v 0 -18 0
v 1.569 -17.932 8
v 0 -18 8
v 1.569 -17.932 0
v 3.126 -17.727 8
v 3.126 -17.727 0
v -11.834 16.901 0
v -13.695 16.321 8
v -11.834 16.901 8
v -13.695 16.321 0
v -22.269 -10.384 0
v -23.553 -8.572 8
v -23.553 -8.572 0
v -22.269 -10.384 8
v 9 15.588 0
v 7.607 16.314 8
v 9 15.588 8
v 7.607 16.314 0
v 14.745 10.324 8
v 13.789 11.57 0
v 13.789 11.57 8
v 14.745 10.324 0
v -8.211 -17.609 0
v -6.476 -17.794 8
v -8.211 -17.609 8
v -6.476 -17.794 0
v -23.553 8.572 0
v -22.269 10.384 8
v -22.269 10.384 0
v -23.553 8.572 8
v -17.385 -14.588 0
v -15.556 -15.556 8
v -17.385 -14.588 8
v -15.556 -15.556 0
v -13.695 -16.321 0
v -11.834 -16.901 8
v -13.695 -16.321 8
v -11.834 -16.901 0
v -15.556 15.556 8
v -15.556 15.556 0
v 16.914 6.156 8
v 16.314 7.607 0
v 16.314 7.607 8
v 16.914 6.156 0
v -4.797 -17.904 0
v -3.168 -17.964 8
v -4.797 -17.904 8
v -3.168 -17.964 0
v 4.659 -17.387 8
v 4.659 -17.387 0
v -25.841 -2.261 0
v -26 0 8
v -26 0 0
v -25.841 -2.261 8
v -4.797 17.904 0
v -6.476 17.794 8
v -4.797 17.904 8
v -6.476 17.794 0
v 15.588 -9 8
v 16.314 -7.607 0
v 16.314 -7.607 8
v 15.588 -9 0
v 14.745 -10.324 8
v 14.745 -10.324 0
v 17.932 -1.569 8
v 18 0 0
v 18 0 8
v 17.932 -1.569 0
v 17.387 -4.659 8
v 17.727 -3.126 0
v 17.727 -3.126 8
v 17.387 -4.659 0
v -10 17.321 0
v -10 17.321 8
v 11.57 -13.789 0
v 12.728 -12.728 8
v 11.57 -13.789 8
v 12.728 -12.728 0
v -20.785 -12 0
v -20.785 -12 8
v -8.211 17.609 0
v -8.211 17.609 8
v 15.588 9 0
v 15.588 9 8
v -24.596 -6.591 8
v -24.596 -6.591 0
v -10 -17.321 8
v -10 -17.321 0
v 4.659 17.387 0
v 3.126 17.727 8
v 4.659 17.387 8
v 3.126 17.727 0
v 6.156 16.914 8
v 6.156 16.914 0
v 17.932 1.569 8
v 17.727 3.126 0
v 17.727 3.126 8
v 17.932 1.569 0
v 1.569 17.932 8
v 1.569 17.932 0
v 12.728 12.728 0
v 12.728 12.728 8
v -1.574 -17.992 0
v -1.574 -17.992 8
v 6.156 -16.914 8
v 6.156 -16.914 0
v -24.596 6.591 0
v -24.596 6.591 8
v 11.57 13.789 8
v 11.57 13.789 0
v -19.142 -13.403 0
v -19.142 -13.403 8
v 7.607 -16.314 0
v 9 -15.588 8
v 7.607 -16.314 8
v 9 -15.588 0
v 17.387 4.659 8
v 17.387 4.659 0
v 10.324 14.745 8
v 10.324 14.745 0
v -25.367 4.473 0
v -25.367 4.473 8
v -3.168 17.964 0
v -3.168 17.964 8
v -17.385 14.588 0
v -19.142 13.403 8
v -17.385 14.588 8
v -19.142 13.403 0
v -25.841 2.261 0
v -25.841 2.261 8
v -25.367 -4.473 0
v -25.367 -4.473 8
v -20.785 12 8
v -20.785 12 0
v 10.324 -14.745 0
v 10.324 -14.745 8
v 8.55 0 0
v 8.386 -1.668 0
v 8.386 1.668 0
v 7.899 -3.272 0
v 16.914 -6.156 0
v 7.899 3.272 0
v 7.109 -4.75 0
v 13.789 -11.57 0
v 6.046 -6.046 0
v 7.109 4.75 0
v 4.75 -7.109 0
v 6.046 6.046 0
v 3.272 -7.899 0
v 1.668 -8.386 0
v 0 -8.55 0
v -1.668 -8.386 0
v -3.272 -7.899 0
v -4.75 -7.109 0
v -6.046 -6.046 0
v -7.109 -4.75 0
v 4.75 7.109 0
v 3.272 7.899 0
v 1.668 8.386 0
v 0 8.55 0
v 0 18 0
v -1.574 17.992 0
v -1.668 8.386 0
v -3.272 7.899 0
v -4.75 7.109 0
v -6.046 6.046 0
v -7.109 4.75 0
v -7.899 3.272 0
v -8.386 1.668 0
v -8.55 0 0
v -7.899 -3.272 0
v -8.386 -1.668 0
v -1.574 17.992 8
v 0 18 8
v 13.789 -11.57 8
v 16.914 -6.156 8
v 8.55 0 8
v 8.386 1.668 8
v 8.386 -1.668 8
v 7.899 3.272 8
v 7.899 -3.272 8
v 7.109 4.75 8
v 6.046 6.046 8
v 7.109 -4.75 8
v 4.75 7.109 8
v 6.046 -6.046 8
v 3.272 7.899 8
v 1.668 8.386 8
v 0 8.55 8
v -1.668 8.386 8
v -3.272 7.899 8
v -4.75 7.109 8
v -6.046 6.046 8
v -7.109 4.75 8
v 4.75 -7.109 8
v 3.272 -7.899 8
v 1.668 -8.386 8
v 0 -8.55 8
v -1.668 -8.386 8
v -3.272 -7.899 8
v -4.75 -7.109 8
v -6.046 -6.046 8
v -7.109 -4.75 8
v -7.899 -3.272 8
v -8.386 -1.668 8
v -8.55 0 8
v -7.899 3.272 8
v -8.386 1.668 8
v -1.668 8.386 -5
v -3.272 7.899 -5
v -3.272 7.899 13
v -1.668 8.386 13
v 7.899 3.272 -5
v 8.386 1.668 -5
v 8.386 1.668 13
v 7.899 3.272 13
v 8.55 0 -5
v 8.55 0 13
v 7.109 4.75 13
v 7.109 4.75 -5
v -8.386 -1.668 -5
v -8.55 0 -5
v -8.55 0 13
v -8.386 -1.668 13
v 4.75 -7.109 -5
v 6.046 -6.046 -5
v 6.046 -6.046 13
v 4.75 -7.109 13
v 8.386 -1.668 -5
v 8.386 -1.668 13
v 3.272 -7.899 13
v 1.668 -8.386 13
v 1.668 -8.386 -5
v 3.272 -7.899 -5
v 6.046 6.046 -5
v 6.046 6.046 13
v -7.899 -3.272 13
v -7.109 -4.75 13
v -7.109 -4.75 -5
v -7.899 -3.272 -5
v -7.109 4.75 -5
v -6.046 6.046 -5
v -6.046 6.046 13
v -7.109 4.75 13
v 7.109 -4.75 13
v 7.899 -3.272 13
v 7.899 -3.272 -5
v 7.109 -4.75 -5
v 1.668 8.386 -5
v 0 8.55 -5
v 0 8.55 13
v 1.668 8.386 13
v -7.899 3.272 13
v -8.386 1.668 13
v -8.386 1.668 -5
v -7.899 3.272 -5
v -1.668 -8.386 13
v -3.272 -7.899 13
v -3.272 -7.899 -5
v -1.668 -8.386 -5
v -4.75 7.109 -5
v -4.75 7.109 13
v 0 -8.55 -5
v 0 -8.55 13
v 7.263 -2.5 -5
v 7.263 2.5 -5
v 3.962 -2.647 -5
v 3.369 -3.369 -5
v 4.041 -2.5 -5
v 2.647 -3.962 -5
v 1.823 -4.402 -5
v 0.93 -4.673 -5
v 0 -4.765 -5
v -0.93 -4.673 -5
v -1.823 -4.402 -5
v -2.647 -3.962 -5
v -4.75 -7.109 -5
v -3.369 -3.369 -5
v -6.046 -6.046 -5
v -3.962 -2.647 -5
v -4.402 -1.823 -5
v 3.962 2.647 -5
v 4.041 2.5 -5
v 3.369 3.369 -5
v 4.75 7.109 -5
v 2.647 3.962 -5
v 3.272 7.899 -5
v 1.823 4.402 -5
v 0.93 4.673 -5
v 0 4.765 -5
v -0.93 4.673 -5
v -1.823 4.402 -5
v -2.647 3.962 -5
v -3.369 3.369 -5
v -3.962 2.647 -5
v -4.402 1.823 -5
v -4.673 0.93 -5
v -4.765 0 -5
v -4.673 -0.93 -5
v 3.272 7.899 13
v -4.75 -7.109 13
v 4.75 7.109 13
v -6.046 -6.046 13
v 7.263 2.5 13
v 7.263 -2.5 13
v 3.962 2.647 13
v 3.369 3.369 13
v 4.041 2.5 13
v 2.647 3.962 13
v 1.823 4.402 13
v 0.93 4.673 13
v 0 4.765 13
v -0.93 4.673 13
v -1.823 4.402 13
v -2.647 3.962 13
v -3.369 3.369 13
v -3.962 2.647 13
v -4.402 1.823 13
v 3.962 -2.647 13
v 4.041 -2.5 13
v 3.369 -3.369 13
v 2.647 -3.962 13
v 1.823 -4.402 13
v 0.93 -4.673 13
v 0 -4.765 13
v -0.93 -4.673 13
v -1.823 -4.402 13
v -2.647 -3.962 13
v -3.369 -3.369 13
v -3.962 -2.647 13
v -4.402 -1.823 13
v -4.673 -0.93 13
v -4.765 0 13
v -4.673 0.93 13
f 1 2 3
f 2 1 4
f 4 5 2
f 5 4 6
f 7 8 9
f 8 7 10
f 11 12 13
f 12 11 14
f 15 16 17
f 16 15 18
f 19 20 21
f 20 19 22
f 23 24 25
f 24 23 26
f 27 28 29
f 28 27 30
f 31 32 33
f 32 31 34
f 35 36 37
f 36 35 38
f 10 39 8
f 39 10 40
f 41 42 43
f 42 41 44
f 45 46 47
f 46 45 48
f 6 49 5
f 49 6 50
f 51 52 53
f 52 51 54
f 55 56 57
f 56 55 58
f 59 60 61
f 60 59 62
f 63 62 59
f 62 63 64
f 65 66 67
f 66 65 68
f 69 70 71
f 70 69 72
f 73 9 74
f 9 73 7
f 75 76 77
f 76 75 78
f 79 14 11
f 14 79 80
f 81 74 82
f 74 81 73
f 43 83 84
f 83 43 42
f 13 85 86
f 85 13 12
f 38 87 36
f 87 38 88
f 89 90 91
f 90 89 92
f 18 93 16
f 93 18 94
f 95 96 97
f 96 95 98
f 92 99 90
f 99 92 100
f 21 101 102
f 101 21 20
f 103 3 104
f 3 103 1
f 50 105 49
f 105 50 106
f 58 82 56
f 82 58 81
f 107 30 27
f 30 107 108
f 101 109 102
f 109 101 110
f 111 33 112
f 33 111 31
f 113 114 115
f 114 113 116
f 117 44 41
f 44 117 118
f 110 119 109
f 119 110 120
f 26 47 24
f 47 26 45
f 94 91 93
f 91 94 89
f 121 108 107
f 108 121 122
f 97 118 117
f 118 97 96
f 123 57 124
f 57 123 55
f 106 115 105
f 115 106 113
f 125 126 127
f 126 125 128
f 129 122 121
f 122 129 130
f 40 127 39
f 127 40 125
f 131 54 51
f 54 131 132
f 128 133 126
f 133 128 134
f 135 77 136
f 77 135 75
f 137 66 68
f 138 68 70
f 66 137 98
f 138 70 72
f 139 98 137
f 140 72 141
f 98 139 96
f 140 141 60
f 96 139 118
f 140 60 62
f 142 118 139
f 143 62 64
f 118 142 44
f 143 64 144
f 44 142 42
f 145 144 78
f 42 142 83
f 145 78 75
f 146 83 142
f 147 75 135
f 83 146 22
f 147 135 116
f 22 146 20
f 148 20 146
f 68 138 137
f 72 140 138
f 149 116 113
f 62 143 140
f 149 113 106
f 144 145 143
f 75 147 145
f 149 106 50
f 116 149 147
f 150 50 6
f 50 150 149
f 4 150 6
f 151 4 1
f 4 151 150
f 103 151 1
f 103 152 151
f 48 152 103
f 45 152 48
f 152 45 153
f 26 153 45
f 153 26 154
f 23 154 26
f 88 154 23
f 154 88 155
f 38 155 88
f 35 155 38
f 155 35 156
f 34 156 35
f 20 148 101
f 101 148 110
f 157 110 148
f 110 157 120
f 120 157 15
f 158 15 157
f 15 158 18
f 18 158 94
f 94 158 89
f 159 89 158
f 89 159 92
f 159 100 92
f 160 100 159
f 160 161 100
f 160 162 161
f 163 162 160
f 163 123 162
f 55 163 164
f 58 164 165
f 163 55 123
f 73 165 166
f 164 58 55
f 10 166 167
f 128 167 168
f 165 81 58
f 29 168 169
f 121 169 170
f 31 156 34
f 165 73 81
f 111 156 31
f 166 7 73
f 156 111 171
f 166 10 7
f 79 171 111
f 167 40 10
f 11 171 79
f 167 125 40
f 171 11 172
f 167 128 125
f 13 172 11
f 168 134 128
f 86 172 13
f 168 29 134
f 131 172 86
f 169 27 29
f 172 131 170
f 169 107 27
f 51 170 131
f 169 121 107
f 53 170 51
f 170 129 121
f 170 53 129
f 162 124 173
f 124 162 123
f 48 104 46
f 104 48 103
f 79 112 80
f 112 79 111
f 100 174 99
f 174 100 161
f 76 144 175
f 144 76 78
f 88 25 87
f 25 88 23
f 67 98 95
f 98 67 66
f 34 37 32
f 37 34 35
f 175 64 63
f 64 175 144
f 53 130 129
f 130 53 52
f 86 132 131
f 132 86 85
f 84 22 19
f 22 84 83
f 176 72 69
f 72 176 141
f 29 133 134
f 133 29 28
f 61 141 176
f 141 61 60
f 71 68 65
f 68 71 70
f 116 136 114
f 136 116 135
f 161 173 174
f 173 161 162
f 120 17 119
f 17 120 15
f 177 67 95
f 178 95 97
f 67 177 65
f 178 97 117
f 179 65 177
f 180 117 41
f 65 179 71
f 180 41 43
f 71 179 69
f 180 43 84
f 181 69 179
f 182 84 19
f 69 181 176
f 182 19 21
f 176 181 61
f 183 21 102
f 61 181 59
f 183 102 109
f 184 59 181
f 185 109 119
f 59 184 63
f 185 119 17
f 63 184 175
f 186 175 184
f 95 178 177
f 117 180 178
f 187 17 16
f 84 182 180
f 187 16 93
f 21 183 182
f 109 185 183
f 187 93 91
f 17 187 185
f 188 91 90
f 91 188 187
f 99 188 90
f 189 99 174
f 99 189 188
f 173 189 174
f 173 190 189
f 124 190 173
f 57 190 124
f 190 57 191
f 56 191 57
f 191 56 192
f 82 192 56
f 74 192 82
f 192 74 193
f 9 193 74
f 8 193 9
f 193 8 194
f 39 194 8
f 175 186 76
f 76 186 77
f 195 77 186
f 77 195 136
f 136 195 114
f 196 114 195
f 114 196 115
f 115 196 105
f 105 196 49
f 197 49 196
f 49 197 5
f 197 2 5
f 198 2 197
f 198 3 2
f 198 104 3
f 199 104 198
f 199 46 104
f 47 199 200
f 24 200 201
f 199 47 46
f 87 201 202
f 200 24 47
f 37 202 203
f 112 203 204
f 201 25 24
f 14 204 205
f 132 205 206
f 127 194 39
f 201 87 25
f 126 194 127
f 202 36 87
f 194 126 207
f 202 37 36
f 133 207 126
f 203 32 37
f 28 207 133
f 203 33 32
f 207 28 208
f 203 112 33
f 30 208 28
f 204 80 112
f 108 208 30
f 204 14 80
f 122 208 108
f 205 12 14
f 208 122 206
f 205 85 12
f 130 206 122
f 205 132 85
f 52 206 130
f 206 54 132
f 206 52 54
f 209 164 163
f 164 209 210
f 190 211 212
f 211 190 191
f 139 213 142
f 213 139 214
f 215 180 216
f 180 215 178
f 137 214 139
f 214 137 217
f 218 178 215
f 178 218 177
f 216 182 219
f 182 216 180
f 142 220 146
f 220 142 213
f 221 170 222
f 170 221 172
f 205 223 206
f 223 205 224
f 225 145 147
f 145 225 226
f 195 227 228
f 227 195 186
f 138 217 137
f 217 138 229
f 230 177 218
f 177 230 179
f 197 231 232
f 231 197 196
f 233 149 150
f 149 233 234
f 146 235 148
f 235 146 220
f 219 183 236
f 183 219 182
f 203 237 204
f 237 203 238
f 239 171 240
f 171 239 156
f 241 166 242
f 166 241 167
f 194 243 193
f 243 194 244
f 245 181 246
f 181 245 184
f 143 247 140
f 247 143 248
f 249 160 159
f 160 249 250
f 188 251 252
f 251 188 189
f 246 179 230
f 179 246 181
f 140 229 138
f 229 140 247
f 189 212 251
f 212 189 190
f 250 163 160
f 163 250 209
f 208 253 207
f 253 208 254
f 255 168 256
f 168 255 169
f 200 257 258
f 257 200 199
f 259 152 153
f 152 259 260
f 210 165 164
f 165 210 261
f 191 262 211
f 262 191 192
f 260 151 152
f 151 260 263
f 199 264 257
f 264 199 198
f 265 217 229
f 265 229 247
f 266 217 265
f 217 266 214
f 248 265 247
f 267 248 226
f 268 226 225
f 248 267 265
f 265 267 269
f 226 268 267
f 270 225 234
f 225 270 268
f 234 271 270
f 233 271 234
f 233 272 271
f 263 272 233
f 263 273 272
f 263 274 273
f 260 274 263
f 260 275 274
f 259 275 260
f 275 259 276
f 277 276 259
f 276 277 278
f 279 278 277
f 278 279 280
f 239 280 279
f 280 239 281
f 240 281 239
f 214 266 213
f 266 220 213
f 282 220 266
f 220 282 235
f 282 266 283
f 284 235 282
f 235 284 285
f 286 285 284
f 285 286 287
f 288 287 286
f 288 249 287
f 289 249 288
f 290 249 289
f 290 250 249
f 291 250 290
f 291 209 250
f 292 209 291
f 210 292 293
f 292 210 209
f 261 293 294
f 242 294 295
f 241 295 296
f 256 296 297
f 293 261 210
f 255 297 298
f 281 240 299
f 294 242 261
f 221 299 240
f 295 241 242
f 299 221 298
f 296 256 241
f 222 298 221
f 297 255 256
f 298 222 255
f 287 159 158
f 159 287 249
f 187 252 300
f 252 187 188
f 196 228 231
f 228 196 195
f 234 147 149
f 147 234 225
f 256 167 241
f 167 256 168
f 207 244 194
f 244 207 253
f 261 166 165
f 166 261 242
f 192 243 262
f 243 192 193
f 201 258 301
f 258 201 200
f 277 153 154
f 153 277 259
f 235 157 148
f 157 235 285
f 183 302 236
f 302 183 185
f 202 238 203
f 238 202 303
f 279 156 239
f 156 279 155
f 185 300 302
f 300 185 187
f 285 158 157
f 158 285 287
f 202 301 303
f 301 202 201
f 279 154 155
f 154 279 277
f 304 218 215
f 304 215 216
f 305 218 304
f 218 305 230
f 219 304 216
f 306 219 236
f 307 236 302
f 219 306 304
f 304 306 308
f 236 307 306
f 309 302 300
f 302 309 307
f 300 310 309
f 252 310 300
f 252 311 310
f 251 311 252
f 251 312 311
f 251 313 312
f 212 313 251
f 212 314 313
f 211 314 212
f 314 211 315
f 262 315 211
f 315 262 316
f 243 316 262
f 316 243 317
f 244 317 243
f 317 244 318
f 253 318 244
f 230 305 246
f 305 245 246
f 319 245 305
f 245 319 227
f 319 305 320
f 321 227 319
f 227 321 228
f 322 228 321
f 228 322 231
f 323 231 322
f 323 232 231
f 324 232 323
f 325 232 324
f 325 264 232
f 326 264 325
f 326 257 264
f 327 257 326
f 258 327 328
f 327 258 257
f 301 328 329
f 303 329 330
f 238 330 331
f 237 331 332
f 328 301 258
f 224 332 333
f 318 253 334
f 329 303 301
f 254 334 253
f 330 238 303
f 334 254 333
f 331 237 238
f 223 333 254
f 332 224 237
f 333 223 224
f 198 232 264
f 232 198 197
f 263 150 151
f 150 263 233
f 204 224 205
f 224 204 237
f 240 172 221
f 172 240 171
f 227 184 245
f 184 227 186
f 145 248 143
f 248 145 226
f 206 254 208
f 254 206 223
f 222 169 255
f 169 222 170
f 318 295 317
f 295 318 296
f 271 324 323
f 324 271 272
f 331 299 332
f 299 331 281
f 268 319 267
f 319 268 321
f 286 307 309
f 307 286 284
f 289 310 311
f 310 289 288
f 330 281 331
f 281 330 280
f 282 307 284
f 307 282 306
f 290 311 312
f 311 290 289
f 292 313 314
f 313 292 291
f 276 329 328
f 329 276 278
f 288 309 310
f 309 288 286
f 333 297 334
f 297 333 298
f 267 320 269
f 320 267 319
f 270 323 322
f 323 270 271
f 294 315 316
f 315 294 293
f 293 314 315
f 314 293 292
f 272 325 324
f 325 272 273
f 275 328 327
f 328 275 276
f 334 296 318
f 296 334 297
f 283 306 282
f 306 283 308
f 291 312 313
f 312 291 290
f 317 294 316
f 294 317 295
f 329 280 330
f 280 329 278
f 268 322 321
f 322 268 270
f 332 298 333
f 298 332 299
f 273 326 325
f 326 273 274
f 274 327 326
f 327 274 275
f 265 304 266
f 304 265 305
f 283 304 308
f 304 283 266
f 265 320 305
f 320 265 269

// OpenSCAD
$fn = 32;

// ----------------------------------------------------------------------
// Cam: base radius 18 mm with a 8 mm lift over 180 degrees
// ----------------------------------------------------------------------

// --- parameters (mm) ---
base_r = 18;              // base radius
lift = 8;                 // lift height above the base radius
lift_span = 180;          // angular width of the lift
lift_start = 90;          // angle where the lift starts
cam_t = 8;                // cam plate thickness
hub_d = 17.1;             // hub diameter
hub_h = 18;               // hub height
bore_d = 9.53;            // bore
key_w = 5;                // keyway width
key_depth = 1.79;         // keyway depth

cam_profile = [[18, 0], [17.932, 1.569], [17.727, 3.126], [17.387, 4.659], [16.914, 6.156], [16.314, 7.607], [15.588, 9], [14.745, 10.324], [13.789, 11.57], [12.728, 12.728], [11.57, 13.789], [10.324, 14.745], [9, 15.588], [7.607, 16.314], [6.156, 16.914], [4.659, 17.387], [3.126, 17.727], [1.569, 17.932], [0, 18], [-1.574, 17.992], [-3.168, 17.964], [-4.797, 17.904], [-6.476, 17.794], [-8.211, 17.609], [-10, 17.321], [-11.834, 16.901], [-13.695, 16.321], [-15.556, 15.556], [-17.385, 14.588], [-19.142, 13.403], [-20.785, 12], [-22.269, 10.384], [-23.553, 8.572], [-24.596, 6.591], [-25.367, 4.473], [-25.841, 2.261], [-26, 0], [-25.841, -2.261], [-25.367, -4.473], [-24.596, -6.591], [-23.553, -8.572], [-22.269, -10.384], [-20.785, -12], [-19.142, -13.403], [-17.385, -14.588], [-15.556, -15.556], [-13.695, -16.321], [-11.834, -16.901], [-10, -17.321], [-8.211, -17.609], [-6.476, -17.794], [-4.797, -17.904], [-3.168, -17.964], [-1.574, -17.992], [0, -18], [1.569, -17.932], [3.126, -17.727], [4.659, -17.387], [6.156, -16.914], [7.607, -16.314], [9, -15.588], [10.324, -14.745], [11.57, -13.789], [12.728, -12.728], [13.789, -11.57], [14.745, -10.324], [15.588, -9], [16.314, -7.607], [16.914, -6.156], [17.387, -4.659], [17.727, -3.126], [17.932, -1.569]];

difference() {
  union() {
    linear_extrude(height = cam_t) polygon(cam_profile);
    /* hub, proud of the cam plate on both sides */
    translate([0, 0, -5]) cylinder(h = hub_h, d = hub_d);
  }
  /* bore through the hub, 2.5 mm clear on both faces */
  translate([0, 0, -7.5]) cylinder(h = hub_h + 5, d = bore_d);
  /* keyway, milled through the whole hub */
  translate([2.973, -2.5, -7.5]) cube([4.29, 5, 23]);
}
